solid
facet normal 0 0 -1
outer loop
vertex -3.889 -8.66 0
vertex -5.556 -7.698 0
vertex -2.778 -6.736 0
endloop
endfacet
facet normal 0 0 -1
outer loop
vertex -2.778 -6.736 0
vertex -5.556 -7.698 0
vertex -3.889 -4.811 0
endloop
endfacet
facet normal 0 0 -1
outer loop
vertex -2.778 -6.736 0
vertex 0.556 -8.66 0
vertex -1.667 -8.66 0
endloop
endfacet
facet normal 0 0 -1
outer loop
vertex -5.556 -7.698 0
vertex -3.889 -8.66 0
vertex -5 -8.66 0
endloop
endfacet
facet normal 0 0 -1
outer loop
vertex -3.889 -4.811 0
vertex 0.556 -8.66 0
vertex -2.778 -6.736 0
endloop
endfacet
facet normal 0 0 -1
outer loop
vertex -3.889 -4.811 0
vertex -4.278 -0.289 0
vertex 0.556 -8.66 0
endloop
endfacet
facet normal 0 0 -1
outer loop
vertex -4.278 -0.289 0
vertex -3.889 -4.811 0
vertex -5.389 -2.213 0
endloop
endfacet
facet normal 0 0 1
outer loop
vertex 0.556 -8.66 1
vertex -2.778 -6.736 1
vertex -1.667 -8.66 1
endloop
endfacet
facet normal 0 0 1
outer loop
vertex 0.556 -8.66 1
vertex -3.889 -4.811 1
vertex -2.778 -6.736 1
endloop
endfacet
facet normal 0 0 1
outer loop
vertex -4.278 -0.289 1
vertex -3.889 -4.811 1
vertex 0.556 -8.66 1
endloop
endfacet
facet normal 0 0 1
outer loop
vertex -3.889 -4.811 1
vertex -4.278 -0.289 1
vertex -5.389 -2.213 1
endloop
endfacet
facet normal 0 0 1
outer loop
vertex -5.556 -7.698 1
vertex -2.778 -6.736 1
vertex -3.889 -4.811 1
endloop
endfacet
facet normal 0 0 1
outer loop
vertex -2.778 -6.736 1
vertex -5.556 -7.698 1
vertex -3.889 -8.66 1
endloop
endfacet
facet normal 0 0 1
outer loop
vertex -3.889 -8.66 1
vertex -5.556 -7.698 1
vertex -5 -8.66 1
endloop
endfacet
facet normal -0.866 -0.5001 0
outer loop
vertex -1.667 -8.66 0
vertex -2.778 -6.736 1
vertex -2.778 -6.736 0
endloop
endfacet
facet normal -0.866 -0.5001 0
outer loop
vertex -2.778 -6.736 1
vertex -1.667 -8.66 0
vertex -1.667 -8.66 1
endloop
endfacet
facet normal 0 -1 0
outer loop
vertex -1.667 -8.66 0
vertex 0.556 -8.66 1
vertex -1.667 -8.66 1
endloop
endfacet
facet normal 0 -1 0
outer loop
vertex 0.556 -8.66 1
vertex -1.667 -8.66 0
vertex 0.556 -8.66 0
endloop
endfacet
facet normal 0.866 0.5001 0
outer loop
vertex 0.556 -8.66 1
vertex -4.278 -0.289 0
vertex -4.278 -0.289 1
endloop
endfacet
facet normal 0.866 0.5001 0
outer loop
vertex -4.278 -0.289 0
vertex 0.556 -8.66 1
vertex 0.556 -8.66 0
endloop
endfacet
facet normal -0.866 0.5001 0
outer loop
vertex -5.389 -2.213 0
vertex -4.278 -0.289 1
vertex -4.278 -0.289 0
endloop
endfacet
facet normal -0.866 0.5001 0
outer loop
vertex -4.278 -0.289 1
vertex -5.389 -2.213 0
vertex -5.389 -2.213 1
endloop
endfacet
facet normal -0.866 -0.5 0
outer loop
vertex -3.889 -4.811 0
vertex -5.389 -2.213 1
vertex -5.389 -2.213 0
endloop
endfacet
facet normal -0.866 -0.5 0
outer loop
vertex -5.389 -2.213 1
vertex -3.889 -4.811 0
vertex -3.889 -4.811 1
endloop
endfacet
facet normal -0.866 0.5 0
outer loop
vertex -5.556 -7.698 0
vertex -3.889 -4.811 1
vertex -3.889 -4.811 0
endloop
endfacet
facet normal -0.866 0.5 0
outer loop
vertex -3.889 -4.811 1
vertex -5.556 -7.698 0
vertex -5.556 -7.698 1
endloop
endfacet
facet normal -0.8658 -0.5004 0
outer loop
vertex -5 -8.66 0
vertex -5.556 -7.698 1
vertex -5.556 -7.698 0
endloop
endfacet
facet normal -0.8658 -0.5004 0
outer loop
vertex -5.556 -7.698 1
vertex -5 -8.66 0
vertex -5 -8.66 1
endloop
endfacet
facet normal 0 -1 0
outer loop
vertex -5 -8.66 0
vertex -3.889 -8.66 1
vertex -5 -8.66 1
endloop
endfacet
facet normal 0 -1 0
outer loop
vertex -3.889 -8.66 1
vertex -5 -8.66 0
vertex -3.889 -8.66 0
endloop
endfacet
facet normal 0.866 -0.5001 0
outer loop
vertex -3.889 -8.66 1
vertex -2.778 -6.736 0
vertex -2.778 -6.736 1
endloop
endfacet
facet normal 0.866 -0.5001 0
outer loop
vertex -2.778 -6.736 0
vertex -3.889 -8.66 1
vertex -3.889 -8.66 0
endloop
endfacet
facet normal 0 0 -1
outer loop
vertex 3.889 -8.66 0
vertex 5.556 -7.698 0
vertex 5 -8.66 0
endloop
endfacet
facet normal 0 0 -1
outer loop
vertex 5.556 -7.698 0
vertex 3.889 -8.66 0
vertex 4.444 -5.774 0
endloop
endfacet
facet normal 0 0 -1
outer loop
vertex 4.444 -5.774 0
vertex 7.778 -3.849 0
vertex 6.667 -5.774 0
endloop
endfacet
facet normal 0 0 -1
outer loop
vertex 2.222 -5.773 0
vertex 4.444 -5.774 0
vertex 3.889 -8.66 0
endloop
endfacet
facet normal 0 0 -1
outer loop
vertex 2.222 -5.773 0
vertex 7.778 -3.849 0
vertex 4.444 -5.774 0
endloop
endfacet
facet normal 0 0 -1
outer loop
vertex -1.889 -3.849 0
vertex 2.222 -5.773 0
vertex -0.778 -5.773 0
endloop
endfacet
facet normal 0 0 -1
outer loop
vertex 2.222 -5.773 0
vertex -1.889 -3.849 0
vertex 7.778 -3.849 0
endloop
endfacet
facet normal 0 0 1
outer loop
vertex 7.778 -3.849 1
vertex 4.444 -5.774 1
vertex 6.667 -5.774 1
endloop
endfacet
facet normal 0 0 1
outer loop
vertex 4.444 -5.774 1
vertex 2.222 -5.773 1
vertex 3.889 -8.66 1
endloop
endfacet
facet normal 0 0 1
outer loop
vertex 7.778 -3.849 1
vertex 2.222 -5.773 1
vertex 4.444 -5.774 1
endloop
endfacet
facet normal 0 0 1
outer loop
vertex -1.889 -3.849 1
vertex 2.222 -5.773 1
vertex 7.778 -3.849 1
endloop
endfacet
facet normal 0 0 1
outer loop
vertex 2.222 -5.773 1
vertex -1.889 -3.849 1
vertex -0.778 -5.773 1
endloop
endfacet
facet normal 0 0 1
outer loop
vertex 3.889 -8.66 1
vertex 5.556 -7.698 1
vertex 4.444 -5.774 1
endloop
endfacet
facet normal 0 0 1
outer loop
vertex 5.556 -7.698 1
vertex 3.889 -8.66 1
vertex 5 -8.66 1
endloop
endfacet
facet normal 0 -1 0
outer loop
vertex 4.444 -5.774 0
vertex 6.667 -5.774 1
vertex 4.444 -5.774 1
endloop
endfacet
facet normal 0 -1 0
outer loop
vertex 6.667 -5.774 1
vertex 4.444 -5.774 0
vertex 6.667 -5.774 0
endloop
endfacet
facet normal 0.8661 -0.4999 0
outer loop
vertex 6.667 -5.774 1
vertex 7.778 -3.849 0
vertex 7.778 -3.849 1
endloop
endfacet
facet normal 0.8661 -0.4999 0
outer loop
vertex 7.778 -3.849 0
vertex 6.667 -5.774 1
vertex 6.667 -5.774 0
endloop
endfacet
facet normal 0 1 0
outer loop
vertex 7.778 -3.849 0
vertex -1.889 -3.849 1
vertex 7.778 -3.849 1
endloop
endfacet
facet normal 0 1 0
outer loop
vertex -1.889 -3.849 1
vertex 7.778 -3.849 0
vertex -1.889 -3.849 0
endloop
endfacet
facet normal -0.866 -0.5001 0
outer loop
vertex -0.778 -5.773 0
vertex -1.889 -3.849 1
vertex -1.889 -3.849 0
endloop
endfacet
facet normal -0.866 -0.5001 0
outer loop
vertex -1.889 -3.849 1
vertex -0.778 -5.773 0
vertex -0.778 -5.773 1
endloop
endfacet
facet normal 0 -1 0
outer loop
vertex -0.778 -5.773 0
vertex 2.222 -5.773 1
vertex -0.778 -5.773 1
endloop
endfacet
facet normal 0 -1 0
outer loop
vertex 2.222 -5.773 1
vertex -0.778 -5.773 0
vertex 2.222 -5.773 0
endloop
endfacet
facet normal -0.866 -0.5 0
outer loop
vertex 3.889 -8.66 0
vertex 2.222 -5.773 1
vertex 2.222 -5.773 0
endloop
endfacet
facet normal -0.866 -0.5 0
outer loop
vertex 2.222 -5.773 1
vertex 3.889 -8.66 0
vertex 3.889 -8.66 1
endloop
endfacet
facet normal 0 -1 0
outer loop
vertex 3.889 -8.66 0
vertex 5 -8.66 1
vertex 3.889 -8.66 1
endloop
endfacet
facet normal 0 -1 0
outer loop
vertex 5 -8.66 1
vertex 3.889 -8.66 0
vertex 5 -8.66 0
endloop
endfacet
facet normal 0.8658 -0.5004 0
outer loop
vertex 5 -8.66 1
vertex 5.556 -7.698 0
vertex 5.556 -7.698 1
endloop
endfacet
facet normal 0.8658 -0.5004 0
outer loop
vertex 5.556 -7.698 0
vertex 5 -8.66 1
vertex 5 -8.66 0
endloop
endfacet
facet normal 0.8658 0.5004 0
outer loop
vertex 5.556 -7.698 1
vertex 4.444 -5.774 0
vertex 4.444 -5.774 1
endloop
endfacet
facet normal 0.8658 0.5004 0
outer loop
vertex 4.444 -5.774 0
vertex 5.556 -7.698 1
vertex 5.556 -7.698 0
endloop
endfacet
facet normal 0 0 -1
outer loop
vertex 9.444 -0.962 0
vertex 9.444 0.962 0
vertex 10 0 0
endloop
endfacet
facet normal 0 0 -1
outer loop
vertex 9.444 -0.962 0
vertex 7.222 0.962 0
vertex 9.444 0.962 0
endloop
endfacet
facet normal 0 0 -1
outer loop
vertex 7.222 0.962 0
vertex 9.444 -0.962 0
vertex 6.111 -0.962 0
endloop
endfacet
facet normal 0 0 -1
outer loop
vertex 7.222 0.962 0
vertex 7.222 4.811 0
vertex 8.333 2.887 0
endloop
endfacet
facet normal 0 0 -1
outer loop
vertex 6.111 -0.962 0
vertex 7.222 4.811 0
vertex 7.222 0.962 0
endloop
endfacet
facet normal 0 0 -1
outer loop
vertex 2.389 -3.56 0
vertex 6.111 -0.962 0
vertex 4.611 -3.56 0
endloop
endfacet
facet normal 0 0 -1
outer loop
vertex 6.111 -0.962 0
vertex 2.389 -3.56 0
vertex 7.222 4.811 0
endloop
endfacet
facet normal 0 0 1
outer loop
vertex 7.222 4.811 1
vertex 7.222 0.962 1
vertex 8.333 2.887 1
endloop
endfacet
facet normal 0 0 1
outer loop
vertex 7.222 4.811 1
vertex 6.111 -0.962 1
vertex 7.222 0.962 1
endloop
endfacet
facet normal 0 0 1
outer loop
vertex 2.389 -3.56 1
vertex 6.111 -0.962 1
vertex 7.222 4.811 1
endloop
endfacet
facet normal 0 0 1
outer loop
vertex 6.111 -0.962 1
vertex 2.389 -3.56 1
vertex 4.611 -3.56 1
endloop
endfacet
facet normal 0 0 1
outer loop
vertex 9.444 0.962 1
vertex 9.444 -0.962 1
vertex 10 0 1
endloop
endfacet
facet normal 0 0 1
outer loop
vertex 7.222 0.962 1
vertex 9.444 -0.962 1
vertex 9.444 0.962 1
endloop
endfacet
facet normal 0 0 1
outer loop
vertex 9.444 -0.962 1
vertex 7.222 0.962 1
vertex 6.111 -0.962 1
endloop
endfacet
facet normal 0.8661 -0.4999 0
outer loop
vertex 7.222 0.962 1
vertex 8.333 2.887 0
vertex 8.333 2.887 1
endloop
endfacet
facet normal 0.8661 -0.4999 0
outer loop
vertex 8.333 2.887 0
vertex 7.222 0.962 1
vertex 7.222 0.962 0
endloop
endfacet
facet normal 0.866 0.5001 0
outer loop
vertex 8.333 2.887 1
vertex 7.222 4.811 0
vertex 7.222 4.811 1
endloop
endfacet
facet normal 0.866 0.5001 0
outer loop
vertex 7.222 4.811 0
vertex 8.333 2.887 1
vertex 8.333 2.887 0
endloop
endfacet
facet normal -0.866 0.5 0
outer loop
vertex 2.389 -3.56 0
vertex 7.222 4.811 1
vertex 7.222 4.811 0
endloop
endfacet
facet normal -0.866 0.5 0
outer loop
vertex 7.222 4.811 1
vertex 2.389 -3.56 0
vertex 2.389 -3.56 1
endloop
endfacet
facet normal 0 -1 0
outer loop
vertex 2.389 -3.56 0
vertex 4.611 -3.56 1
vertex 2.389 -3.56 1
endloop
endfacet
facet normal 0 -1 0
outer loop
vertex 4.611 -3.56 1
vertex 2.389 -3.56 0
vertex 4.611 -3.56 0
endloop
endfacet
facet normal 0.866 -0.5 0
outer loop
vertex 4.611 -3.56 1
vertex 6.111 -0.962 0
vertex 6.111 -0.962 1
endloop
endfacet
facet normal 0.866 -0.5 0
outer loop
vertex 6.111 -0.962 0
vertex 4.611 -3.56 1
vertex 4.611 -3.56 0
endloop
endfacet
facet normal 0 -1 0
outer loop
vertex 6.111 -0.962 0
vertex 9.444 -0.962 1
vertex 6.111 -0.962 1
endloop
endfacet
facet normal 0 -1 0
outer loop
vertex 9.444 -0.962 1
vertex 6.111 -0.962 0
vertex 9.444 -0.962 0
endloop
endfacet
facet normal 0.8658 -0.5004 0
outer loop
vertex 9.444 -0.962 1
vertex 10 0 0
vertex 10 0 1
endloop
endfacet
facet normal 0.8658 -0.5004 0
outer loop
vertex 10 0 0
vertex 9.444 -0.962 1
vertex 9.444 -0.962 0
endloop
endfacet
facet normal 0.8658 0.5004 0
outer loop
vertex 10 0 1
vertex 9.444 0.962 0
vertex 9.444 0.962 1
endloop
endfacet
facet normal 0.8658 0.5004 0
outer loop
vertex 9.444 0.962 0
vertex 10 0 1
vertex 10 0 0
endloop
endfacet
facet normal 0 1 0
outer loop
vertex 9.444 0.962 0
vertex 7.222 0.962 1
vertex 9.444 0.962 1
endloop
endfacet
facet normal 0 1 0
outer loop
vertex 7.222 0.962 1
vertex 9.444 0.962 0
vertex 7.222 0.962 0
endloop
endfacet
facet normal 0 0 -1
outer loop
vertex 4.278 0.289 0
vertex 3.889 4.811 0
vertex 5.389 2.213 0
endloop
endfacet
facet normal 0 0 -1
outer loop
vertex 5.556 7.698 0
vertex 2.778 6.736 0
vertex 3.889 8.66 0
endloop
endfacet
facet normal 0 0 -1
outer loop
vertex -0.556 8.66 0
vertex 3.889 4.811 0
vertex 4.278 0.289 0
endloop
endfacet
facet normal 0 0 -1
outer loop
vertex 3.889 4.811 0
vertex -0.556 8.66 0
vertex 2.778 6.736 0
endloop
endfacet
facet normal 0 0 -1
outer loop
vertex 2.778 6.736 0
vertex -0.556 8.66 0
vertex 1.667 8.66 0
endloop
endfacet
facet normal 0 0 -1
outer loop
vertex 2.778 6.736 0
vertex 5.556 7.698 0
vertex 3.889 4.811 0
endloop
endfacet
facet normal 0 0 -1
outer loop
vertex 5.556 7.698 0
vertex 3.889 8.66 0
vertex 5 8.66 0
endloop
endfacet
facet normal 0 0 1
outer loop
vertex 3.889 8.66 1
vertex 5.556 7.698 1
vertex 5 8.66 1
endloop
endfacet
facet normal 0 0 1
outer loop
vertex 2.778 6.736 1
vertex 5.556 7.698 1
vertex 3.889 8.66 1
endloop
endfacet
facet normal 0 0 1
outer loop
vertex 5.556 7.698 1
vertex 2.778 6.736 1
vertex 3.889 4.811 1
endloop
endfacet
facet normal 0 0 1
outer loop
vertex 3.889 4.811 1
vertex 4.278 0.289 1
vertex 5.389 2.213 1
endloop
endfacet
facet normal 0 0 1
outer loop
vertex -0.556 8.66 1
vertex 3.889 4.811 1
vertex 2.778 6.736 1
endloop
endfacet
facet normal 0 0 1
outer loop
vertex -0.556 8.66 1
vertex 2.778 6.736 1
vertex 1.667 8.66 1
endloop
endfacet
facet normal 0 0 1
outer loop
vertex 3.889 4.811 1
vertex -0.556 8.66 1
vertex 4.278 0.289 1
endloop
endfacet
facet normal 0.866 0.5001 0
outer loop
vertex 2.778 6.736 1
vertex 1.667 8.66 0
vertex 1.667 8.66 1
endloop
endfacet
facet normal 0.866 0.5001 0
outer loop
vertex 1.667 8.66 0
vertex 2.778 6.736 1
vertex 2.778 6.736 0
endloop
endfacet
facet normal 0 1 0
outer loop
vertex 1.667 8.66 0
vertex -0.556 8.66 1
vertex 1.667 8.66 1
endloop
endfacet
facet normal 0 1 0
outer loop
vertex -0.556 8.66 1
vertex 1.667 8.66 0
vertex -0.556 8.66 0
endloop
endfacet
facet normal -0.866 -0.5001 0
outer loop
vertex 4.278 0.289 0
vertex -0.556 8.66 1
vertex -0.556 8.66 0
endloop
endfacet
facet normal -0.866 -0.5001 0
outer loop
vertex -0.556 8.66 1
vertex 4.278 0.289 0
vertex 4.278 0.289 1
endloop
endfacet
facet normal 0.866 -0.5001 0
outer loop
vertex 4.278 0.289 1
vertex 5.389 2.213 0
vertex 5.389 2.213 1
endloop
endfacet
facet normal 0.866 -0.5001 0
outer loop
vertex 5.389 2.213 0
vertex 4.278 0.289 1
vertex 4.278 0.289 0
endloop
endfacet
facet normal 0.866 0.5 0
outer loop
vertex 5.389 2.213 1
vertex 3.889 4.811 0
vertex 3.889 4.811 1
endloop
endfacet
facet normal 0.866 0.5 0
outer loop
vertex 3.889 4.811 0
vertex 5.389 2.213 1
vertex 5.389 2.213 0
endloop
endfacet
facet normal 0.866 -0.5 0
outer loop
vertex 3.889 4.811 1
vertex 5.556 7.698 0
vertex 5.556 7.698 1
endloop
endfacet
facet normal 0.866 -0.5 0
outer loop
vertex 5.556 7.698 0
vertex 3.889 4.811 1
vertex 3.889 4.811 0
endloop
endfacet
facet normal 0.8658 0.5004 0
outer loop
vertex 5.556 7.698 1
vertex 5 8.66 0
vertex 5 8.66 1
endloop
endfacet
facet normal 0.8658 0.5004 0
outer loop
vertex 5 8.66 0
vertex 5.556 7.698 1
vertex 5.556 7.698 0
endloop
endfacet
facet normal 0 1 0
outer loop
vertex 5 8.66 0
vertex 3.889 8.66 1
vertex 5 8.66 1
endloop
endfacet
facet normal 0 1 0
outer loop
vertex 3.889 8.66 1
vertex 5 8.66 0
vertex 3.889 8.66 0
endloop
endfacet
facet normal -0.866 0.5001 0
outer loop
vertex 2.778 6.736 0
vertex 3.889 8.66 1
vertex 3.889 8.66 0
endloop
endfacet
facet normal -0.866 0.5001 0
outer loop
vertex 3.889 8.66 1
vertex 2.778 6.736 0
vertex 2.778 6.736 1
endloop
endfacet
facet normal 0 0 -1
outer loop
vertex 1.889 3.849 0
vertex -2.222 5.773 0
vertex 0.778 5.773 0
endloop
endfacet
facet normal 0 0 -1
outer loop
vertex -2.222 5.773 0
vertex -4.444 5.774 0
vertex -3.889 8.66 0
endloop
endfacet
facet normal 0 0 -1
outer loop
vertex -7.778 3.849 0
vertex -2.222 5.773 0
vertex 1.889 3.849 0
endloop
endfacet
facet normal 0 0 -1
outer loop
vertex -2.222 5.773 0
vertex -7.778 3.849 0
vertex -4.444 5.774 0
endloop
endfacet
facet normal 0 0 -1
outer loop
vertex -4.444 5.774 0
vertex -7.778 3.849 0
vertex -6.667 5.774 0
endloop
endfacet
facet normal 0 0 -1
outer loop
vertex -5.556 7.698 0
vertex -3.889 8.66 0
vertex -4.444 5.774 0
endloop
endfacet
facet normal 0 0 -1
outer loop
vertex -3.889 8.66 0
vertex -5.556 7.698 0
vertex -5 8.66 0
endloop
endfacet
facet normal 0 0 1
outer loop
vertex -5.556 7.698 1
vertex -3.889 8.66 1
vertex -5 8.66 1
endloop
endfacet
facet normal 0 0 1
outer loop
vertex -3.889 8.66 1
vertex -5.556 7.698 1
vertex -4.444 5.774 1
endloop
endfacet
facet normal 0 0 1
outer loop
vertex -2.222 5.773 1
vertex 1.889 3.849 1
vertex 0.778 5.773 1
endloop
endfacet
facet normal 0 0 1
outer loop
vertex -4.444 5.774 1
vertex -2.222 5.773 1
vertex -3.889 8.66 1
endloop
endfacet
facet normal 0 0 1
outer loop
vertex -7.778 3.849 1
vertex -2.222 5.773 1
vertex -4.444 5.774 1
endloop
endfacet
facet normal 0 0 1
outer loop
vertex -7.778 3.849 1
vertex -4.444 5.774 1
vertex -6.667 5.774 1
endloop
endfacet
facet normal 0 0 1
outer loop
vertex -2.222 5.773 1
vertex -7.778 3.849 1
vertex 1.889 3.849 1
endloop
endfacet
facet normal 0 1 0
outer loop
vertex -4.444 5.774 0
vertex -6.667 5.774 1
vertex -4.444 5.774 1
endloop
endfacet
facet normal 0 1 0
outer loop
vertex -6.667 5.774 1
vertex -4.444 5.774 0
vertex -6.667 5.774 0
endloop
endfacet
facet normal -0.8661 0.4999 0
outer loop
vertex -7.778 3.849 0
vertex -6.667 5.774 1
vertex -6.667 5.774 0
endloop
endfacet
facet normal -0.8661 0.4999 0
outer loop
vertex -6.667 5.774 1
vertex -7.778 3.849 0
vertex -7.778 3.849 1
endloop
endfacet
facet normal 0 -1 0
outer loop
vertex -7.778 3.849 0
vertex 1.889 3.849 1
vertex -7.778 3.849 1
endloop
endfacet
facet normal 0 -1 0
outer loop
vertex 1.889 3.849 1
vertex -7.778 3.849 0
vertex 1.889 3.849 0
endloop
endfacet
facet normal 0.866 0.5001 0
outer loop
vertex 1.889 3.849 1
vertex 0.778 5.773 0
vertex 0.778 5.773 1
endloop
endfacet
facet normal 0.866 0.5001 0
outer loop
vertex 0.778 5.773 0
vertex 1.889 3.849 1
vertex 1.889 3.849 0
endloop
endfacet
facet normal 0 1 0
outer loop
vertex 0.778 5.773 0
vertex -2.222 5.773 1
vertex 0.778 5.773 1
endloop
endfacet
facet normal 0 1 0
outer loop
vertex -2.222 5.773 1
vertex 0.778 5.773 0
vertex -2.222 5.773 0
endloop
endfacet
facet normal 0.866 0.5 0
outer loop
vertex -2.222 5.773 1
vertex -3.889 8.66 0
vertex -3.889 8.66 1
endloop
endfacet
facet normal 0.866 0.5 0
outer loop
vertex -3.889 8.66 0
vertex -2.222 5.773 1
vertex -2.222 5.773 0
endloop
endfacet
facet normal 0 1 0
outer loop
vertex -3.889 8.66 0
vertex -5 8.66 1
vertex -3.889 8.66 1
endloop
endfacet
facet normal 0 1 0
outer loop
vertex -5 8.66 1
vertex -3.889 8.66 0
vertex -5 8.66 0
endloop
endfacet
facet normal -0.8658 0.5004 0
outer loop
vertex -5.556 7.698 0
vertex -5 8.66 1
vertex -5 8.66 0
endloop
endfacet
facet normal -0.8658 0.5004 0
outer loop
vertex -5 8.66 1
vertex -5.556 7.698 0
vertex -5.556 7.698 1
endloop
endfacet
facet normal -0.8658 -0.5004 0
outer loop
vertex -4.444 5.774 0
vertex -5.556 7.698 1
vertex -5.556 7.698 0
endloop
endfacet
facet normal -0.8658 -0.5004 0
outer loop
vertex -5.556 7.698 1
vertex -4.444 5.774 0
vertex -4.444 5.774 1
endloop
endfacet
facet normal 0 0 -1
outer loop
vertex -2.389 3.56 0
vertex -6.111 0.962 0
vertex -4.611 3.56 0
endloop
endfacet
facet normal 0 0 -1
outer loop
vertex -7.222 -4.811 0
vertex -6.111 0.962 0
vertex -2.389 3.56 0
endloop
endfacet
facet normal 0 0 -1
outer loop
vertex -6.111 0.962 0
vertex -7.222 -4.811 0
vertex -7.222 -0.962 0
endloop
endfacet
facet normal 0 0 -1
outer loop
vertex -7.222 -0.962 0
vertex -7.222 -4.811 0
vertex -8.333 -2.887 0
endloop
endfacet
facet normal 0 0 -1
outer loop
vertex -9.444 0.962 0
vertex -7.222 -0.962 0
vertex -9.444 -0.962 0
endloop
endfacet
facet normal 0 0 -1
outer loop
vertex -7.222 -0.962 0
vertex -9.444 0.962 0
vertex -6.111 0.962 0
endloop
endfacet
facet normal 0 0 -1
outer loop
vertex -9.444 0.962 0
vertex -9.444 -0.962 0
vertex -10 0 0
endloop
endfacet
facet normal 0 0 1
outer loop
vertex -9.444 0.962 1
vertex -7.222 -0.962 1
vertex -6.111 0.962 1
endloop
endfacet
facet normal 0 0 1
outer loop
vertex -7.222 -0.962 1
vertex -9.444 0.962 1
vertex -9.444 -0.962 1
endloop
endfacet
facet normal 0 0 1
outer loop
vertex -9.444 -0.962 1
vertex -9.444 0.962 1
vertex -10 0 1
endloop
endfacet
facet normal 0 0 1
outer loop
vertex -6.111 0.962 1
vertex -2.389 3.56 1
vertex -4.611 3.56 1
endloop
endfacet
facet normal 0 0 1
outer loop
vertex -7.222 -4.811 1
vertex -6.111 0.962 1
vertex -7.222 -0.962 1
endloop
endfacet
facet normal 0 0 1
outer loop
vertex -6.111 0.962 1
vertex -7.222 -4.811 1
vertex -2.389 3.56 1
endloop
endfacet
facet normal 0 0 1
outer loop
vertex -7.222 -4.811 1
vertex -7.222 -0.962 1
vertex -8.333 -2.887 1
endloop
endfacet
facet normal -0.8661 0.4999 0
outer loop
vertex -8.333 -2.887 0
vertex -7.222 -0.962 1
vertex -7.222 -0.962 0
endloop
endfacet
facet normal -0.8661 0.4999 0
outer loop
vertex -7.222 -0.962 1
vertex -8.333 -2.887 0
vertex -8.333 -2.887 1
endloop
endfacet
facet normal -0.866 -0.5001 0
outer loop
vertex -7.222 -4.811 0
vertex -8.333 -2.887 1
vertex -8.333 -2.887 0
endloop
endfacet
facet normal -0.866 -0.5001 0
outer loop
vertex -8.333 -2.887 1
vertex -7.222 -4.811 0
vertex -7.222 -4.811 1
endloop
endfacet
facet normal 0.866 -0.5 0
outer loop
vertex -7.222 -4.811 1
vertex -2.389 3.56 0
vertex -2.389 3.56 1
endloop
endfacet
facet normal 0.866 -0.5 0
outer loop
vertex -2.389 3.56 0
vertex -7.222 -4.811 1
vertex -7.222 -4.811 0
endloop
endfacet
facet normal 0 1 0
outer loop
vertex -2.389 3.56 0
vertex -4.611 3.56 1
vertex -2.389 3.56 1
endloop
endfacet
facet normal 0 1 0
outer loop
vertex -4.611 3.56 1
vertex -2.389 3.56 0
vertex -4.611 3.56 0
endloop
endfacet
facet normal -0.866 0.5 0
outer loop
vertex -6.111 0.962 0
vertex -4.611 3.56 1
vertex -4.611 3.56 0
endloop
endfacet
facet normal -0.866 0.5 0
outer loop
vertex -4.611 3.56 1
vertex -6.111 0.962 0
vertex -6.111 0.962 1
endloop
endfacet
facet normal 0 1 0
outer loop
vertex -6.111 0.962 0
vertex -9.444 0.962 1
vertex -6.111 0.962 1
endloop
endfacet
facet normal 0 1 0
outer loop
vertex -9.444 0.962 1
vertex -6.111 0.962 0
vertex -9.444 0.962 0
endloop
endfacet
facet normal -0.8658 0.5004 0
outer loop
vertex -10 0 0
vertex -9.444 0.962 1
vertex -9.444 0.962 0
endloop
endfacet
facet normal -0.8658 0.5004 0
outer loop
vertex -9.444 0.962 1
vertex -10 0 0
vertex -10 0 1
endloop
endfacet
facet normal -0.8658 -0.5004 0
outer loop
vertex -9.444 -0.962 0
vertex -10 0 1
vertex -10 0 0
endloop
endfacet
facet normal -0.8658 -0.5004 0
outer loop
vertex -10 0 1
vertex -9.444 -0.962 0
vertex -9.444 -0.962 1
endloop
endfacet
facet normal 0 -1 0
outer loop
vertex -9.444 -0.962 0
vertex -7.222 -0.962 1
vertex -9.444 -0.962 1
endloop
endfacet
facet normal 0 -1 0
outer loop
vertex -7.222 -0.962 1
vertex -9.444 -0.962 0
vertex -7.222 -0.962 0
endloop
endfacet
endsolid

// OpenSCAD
unit = [1, 0];
origin = [0, 0];


/*
    Returns a 2D rotation matrix given an angle.
*/
function rot2d(angle) = [
    [+cos(angle), -sin(angle)],
    [+sin(angle), +cos(angle)]
];


/*
    Calculates the points for a hexagon.
    Used to reference off of for creating the lambda.
    Points are created starting from the right and moving counter-clockwise.

         2   1

      3         0

         4   5
*/
function inner_hex_points(data) = [
    for (angle = [0 : 60 : 300]) 
    dict_get(data, "scale") * rot2d(angle) * unit
];



/*
    Calculates the points for making a lambda.

    Returns two a list of two lists.
    The first list contains the offset for making a flake.
    The second list is used to form the lambda polygon.
*/
function lambda_points(data) =
let (
    hex_points = inner_hex_points(data),
    thickness = dict_get(data, "thickness") / 2,
    top_left = hex_points[2],
    bottom_left = hex_points[4],
    bottom_right = hex_points[5],
    v_0 = thickness * unit,
    v_p60 = thickness * rot2d(60) * unit,
    v_n60 = thickness * rot2d(-60) * unit,
    v_n90 = thickness * rot2d(-90) * unit,
    gap = dict_get(data, "gap") * rot2d(-60) * unit
)
[
    [
        top_left + v_p60,
    ],
    [
        top_left - v_p60 + gap,
        top_left + v_p60 + gap,
        bottom_right + v_0,
        bottom_right - v_0,
        sqrt(3) * v_n90,
        bottom_left + v_0,
        bottom_left,
        bottom_left - v_n60,
        -v_0
    ]
];


/*
    Generates a single lambda at the origin.
*/
module lambda(data) {
    new_data = update_params(data);
    linear_extrude(dict_get(new_data, "height"))
    polygon(lambda_points(new_data)[1]);
}


/*
    Generates a NixOS flake.
*/
module flake(data) {
    new_data = update_params(data);
    colors = dict_get(data, "colors");
    echo(colors);
    for (idx = [0 : 5]) {
        color(colors[idx % len(colors)])
        rotate([0, 0, idx * 60]) 
        translate(-lambda_points(new_data)[0][0])
        translate([-dict_get(new_data, "scale"), 0, 0])
        linear_extrude(dict_get(new_data, "height"))
        polygon(lambda_points(new_data)[1]);
    }
}


/*
    Returns the value from a associative array/dictionary type structure given some key.

    Values can be of any type.
    The dictionary must of be of the form:
    [
        [ "key0", <value0> ],
        [ "key1", <value1> ],
        ...
    ]
*/
function dict_get(dict, key) =
  dict[search([key], dict)[0]][1];


/*
    Updates the user parameters so the flake is unit size when `scale = 1`.
*/
function update_params(data) = let
    // factor was empirically found. It gives a flake that is circumscribed by the unit circle.
    (factor = 2.25) [
    [ "gap", 0.75 * dict_get(data, "scale") * dict_get(data, "gap") / factor ],
    [ "height", dict_get(data, "height") ],
    [ "scale", dict_get(data, "scale") / factor ],
    [ "thickness", dict_get(data, "scale") * dict_get(data, "thickness") / factor ],
];


/*
    The parameters for generating a NixOS flake.

    `gap` - The gap between lambdas.
    `height` - The z-height of the flake.
    `scale` - The radial (x,y) size of the flake.
    `thickness` - The thickness of the lambda legs.

    `scale` updates `gap` and `thickness` so there is no need to compesate these values.
    A `gap` of 0 will leave no gap between the lambdas.
    A `gap` of 1 will remove the top portion of the long lambda leg until the point where the two lambda legs intersect.

    A `gap` of 0.05 to 0.15 is a good value for replicating the official NixOS flake.
    A `thickness` of 0.5 is a good value for replicating the official NixOS flake.
    OpenSCAD doesn't have a concept of units so use `scale` and `height` values in the desired ratio.
*/
params = [
    [ "gap", 0.1 ],
    [ "height", 1 ],
    [ "scale", 10 ],
    [ "thickness", 0.5 ],
    // [ "colors", ["#5277C3", "#7EBAE4"]],
    [ "colors", ["#b40bdf", "#ffd200"]],
];


flake(params);
